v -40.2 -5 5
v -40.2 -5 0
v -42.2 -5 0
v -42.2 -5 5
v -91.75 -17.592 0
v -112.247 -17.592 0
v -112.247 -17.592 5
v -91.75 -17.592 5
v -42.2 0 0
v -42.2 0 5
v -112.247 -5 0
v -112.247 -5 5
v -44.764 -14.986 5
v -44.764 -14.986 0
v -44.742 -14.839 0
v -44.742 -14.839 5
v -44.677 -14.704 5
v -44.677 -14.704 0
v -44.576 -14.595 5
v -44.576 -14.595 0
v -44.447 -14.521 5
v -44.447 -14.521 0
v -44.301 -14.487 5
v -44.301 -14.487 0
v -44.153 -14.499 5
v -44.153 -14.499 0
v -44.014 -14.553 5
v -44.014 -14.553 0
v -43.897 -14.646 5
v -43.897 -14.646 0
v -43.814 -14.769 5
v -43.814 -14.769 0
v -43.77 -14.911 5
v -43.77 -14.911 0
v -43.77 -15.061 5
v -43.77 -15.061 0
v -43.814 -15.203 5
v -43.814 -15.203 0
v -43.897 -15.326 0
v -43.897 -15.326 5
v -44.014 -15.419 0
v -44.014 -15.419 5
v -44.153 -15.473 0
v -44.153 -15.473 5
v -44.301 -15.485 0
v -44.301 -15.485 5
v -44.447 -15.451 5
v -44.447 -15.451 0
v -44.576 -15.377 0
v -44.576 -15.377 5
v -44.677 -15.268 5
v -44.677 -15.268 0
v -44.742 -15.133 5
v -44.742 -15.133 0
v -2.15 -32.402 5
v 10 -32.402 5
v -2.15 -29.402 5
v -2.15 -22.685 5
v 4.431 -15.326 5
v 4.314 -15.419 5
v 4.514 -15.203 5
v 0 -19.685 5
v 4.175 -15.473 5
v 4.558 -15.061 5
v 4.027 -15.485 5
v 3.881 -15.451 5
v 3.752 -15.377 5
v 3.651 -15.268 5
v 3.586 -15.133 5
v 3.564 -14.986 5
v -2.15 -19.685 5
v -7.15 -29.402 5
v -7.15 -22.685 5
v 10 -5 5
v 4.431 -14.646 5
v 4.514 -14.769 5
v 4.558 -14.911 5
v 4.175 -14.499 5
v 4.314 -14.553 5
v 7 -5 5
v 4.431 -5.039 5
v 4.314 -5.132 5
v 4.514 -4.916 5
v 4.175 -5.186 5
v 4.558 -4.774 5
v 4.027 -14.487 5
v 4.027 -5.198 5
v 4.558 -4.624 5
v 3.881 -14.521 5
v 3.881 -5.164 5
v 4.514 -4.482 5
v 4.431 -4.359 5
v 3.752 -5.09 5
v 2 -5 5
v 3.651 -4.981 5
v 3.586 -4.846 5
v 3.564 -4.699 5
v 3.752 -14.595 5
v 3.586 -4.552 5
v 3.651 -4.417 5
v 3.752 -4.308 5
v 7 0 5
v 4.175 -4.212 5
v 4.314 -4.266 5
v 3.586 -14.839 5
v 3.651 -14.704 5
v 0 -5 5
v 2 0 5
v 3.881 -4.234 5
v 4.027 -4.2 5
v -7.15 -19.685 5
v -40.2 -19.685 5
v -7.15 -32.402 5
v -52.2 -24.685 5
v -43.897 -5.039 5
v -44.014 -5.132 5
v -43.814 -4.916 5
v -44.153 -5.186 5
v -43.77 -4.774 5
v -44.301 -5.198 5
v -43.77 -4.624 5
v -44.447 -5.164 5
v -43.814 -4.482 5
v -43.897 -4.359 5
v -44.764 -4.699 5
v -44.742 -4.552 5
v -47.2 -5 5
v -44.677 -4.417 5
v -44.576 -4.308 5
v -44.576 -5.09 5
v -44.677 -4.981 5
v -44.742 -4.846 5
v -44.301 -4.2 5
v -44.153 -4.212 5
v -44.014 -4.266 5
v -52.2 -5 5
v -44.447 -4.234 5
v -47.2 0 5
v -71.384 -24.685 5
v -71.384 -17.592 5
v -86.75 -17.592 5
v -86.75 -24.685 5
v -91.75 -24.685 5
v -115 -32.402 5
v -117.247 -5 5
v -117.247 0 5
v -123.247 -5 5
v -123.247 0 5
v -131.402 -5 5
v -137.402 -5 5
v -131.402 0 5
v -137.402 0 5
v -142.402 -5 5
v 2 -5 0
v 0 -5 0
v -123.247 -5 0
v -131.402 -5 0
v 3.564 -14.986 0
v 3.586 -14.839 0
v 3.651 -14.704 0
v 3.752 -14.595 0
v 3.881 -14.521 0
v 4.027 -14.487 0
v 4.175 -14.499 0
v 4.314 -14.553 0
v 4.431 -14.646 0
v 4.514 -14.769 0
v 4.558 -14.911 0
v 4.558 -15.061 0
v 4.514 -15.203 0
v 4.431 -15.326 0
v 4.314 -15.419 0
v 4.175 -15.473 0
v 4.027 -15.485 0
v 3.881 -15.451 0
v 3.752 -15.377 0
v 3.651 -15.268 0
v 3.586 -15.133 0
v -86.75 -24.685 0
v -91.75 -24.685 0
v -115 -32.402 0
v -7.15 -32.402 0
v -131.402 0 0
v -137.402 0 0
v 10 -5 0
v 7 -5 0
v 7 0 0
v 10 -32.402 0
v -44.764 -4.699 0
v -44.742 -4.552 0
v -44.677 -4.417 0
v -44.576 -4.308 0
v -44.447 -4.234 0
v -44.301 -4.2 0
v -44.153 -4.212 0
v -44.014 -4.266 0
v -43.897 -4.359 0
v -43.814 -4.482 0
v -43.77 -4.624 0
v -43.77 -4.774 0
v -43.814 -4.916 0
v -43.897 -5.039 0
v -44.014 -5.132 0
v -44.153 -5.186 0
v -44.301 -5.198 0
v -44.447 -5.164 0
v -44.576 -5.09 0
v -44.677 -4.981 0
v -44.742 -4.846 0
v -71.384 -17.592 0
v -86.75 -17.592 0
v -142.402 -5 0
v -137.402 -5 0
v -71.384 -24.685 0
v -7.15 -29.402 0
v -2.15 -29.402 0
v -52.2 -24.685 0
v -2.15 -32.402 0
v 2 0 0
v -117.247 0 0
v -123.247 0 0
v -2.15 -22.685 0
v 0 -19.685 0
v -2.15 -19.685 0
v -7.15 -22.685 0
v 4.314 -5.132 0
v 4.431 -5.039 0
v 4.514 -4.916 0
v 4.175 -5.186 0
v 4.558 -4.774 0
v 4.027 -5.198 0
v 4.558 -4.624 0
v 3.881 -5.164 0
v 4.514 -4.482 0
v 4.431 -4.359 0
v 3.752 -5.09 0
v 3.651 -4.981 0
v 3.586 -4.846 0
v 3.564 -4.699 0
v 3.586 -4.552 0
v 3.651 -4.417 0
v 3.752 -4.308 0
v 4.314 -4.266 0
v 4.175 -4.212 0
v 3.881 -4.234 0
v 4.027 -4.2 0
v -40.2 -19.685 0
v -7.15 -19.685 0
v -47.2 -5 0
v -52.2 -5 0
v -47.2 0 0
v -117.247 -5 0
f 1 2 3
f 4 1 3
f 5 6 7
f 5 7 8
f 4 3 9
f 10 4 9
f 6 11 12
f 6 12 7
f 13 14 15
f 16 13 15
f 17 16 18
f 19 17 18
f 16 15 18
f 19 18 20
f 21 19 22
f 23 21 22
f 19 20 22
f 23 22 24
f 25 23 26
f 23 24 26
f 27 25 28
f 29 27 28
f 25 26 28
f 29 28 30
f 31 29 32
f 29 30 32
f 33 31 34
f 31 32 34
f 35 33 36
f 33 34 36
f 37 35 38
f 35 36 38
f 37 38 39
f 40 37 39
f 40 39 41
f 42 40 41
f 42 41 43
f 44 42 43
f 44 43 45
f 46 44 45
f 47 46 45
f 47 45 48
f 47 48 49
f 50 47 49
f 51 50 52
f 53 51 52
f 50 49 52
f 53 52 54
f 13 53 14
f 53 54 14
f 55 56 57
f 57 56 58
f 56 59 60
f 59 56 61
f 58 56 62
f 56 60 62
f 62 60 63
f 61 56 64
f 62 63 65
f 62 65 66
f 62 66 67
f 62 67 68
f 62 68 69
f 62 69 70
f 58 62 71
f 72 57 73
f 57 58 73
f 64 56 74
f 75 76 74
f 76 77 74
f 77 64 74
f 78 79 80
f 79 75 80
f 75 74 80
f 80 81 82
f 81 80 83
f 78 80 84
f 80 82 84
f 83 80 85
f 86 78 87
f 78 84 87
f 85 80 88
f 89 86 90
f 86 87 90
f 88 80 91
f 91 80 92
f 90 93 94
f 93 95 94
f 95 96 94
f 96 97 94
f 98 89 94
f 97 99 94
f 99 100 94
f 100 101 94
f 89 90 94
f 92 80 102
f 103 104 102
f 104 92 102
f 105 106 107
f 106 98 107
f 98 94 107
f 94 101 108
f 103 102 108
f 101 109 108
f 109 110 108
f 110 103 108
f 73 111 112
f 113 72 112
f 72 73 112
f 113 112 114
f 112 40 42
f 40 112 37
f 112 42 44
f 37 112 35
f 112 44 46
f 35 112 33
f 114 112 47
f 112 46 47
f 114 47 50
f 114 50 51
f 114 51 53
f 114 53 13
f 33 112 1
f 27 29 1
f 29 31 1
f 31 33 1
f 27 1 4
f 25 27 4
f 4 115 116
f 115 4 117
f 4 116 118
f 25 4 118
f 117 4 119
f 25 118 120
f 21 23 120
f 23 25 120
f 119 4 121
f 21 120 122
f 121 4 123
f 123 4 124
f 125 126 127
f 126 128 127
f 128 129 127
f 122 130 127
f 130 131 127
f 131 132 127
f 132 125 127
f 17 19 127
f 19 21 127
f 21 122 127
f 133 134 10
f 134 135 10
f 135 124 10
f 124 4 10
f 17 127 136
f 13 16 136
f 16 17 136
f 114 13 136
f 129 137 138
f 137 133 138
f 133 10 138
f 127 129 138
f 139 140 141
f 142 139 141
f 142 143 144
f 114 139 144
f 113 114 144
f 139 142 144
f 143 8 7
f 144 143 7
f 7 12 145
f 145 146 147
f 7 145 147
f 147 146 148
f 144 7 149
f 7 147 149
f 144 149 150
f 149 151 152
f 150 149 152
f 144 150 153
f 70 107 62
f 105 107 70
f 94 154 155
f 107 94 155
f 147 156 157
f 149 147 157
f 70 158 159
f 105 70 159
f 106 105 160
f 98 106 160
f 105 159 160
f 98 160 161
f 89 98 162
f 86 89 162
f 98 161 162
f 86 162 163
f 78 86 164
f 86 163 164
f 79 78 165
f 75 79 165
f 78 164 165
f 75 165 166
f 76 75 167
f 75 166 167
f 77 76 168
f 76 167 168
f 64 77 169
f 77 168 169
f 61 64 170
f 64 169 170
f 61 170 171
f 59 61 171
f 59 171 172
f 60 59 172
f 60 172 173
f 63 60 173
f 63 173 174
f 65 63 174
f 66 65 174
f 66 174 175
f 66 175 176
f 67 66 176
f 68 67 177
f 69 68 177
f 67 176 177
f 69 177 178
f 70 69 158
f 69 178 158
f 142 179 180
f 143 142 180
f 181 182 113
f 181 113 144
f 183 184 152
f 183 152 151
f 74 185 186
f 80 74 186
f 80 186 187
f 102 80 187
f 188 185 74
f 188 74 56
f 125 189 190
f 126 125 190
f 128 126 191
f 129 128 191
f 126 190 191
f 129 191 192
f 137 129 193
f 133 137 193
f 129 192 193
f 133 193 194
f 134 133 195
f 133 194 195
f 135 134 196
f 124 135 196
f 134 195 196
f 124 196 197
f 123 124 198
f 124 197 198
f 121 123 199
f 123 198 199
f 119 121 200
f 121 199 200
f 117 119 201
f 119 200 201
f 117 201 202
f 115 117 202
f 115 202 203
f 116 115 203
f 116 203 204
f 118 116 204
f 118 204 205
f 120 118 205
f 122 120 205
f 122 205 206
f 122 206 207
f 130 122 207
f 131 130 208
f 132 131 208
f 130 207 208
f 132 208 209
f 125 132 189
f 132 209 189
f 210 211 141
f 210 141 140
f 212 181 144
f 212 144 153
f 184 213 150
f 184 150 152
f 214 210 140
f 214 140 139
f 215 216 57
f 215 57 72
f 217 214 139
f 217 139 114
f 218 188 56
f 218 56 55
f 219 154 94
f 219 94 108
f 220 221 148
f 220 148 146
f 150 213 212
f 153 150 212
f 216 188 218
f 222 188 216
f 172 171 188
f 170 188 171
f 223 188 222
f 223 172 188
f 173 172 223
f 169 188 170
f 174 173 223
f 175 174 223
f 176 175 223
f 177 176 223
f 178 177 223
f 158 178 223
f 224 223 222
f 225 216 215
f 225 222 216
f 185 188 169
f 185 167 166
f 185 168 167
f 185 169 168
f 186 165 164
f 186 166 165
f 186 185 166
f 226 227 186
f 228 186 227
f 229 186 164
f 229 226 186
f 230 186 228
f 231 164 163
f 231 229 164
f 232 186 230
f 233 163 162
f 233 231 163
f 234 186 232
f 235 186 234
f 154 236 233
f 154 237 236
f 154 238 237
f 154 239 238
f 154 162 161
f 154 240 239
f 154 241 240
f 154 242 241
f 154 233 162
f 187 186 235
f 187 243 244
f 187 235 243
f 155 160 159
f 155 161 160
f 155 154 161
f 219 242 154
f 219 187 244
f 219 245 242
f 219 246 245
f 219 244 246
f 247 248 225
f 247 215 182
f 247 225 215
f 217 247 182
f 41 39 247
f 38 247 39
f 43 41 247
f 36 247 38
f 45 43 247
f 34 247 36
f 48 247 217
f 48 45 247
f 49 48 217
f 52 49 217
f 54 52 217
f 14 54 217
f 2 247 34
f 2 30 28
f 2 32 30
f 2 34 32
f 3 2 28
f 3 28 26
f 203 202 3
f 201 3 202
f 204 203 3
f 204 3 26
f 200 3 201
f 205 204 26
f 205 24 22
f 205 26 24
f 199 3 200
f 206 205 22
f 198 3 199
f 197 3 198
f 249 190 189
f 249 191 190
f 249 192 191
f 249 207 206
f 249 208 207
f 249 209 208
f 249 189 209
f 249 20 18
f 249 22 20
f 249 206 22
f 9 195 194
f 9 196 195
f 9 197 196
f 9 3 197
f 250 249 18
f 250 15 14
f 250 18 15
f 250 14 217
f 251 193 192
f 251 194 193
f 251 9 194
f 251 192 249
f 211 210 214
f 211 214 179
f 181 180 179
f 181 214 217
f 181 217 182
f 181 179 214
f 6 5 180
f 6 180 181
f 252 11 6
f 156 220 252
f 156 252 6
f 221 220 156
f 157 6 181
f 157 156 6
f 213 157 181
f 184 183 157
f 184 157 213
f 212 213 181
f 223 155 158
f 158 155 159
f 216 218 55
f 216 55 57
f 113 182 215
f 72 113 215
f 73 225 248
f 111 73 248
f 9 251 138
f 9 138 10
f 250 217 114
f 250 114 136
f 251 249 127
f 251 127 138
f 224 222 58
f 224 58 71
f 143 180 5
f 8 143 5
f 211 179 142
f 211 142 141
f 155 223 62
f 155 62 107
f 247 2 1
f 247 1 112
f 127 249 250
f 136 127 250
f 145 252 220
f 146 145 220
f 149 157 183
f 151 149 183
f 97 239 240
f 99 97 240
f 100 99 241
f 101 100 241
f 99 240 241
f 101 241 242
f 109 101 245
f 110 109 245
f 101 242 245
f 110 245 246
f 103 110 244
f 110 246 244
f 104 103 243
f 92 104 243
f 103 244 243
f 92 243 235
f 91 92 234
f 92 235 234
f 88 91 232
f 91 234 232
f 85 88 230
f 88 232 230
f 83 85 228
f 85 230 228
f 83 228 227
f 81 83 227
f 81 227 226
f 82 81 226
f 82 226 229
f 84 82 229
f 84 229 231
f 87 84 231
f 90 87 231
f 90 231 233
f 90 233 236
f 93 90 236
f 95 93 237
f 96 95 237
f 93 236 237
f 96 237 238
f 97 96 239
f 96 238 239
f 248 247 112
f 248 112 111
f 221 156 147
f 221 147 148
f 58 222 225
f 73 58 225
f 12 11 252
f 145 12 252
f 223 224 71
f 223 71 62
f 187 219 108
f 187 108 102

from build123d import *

# Parameters (mm, degrees)
BOSS_EXTRU_1_DEPTH = 5
ESQUISSE2_W        = 5
ESQUISSE2_H        = 3
ESQUISSE2_H_2      = 7.0925
ESQUISSE2_W_2      = 3
ESQUISSE2_H_3      = 5
ESQUISSE2_W_3      = 2
ESQUISSE2_W_4      = 8.154681838
ESQUISSE2_W_5      = 10
CR_NEAUX_DEPTH     = 5
ESQUISSE3_R        = 0.5
PER_AGES_DEPTH     = 5


with BuildPart() as part:
    # Esquisse1 → Boss.-Extru.1 (new body)
    with BuildSketch(Plane.XY):
        Polygon((-40.2, 0), (-40.2, -19.685), (0, -19.685), (0, 0), (10, 0), (10, -32.401636706), (-115, -32.401636706), (-147.401636706, 0), (-112.246954868, 0), (-112.246954868, -17.5925), (-71.384202009, -17.5925), (-71.384202009, -24.685), (-52.2, -24.685), (-52.2, 0), align=None)
    extrude(amount=BOSS_EXTRU_1_DEPTH)

    # Esquisse2 → Créneaux - (cut)
    with BuildSketch(Plane(origin=(0, 0, 0), x_dir=(-1, 0, 0), z_dir=(0, 0, -1))):
        with Locations((4.65, -21.185)):
            Rectangle(ESQUISSE2_W, ESQUISSE2_H)
        with Locations((89.250434868, -21.13875)):
            Rectangle(ESQUISSE2_W, ESQUISSE2_H_2)
        with Locations((4.65, -30.901636706)):
            Rectangle(ESQUISSE2_W, ESQUISSE2_H)
        with Locations((-8.5, -2.5)):
            Rectangle(ESQUISSE2_W_2, ESQUISSE2_H_3)
        with Locations((-1, -2.5)):
            Rectangle(ESQUISSE2_W_3, ESQUISSE2_H_3)
        with Locations((41.2, -2.5)):
            Rectangle(ESQUISSE2_W_3, ESQUISSE2_H_3)
        with Locations((49.7, -2.5)):
            Rectangle(ESQUISSE2_W, ESQUISSE2_H_3)
        with Locations((114.746954868, -2.5)):
            Rectangle(ESQUISSE2_W, ESQUISSE2_H_3)
        with Locations((127.324295787, -2.5)):
            Rectangle(ESQUISSE2_W_4, ESQUISSE2_H_3)
        with Locations((142.401636706, -2.5)):
            Rectangle(ESQUISSE2_W_5, ESQUISSE2_H_3)
    extrude(amount=-CR_NEAUX_DEPTH, mode=Mode.SUBTRACT)

    # Esquisse3 → Perçages (cut)
    with BuildSketch(Plane(origin=(0, 0, 0), x_dir=(-1, 0, 0), z_dir=(0, 0, -1))):
        with Locations((-4.064, -14.986)):
            Circle(ESQUISSE3_R)
        with Locations((-4.064, -4.699)):
            Circle(ESQUISSE3_R)
        with Locations((44.264, -14.986)):
            Circle(ESQUISSE3_R)
        with Locations((44.264, -4.699)):
            Circle(ESQUISSE3_R)
    extrude(amount=-PER_AGES_DEPTH, mode=Mode.SUBTRACT)


solid = part.part
